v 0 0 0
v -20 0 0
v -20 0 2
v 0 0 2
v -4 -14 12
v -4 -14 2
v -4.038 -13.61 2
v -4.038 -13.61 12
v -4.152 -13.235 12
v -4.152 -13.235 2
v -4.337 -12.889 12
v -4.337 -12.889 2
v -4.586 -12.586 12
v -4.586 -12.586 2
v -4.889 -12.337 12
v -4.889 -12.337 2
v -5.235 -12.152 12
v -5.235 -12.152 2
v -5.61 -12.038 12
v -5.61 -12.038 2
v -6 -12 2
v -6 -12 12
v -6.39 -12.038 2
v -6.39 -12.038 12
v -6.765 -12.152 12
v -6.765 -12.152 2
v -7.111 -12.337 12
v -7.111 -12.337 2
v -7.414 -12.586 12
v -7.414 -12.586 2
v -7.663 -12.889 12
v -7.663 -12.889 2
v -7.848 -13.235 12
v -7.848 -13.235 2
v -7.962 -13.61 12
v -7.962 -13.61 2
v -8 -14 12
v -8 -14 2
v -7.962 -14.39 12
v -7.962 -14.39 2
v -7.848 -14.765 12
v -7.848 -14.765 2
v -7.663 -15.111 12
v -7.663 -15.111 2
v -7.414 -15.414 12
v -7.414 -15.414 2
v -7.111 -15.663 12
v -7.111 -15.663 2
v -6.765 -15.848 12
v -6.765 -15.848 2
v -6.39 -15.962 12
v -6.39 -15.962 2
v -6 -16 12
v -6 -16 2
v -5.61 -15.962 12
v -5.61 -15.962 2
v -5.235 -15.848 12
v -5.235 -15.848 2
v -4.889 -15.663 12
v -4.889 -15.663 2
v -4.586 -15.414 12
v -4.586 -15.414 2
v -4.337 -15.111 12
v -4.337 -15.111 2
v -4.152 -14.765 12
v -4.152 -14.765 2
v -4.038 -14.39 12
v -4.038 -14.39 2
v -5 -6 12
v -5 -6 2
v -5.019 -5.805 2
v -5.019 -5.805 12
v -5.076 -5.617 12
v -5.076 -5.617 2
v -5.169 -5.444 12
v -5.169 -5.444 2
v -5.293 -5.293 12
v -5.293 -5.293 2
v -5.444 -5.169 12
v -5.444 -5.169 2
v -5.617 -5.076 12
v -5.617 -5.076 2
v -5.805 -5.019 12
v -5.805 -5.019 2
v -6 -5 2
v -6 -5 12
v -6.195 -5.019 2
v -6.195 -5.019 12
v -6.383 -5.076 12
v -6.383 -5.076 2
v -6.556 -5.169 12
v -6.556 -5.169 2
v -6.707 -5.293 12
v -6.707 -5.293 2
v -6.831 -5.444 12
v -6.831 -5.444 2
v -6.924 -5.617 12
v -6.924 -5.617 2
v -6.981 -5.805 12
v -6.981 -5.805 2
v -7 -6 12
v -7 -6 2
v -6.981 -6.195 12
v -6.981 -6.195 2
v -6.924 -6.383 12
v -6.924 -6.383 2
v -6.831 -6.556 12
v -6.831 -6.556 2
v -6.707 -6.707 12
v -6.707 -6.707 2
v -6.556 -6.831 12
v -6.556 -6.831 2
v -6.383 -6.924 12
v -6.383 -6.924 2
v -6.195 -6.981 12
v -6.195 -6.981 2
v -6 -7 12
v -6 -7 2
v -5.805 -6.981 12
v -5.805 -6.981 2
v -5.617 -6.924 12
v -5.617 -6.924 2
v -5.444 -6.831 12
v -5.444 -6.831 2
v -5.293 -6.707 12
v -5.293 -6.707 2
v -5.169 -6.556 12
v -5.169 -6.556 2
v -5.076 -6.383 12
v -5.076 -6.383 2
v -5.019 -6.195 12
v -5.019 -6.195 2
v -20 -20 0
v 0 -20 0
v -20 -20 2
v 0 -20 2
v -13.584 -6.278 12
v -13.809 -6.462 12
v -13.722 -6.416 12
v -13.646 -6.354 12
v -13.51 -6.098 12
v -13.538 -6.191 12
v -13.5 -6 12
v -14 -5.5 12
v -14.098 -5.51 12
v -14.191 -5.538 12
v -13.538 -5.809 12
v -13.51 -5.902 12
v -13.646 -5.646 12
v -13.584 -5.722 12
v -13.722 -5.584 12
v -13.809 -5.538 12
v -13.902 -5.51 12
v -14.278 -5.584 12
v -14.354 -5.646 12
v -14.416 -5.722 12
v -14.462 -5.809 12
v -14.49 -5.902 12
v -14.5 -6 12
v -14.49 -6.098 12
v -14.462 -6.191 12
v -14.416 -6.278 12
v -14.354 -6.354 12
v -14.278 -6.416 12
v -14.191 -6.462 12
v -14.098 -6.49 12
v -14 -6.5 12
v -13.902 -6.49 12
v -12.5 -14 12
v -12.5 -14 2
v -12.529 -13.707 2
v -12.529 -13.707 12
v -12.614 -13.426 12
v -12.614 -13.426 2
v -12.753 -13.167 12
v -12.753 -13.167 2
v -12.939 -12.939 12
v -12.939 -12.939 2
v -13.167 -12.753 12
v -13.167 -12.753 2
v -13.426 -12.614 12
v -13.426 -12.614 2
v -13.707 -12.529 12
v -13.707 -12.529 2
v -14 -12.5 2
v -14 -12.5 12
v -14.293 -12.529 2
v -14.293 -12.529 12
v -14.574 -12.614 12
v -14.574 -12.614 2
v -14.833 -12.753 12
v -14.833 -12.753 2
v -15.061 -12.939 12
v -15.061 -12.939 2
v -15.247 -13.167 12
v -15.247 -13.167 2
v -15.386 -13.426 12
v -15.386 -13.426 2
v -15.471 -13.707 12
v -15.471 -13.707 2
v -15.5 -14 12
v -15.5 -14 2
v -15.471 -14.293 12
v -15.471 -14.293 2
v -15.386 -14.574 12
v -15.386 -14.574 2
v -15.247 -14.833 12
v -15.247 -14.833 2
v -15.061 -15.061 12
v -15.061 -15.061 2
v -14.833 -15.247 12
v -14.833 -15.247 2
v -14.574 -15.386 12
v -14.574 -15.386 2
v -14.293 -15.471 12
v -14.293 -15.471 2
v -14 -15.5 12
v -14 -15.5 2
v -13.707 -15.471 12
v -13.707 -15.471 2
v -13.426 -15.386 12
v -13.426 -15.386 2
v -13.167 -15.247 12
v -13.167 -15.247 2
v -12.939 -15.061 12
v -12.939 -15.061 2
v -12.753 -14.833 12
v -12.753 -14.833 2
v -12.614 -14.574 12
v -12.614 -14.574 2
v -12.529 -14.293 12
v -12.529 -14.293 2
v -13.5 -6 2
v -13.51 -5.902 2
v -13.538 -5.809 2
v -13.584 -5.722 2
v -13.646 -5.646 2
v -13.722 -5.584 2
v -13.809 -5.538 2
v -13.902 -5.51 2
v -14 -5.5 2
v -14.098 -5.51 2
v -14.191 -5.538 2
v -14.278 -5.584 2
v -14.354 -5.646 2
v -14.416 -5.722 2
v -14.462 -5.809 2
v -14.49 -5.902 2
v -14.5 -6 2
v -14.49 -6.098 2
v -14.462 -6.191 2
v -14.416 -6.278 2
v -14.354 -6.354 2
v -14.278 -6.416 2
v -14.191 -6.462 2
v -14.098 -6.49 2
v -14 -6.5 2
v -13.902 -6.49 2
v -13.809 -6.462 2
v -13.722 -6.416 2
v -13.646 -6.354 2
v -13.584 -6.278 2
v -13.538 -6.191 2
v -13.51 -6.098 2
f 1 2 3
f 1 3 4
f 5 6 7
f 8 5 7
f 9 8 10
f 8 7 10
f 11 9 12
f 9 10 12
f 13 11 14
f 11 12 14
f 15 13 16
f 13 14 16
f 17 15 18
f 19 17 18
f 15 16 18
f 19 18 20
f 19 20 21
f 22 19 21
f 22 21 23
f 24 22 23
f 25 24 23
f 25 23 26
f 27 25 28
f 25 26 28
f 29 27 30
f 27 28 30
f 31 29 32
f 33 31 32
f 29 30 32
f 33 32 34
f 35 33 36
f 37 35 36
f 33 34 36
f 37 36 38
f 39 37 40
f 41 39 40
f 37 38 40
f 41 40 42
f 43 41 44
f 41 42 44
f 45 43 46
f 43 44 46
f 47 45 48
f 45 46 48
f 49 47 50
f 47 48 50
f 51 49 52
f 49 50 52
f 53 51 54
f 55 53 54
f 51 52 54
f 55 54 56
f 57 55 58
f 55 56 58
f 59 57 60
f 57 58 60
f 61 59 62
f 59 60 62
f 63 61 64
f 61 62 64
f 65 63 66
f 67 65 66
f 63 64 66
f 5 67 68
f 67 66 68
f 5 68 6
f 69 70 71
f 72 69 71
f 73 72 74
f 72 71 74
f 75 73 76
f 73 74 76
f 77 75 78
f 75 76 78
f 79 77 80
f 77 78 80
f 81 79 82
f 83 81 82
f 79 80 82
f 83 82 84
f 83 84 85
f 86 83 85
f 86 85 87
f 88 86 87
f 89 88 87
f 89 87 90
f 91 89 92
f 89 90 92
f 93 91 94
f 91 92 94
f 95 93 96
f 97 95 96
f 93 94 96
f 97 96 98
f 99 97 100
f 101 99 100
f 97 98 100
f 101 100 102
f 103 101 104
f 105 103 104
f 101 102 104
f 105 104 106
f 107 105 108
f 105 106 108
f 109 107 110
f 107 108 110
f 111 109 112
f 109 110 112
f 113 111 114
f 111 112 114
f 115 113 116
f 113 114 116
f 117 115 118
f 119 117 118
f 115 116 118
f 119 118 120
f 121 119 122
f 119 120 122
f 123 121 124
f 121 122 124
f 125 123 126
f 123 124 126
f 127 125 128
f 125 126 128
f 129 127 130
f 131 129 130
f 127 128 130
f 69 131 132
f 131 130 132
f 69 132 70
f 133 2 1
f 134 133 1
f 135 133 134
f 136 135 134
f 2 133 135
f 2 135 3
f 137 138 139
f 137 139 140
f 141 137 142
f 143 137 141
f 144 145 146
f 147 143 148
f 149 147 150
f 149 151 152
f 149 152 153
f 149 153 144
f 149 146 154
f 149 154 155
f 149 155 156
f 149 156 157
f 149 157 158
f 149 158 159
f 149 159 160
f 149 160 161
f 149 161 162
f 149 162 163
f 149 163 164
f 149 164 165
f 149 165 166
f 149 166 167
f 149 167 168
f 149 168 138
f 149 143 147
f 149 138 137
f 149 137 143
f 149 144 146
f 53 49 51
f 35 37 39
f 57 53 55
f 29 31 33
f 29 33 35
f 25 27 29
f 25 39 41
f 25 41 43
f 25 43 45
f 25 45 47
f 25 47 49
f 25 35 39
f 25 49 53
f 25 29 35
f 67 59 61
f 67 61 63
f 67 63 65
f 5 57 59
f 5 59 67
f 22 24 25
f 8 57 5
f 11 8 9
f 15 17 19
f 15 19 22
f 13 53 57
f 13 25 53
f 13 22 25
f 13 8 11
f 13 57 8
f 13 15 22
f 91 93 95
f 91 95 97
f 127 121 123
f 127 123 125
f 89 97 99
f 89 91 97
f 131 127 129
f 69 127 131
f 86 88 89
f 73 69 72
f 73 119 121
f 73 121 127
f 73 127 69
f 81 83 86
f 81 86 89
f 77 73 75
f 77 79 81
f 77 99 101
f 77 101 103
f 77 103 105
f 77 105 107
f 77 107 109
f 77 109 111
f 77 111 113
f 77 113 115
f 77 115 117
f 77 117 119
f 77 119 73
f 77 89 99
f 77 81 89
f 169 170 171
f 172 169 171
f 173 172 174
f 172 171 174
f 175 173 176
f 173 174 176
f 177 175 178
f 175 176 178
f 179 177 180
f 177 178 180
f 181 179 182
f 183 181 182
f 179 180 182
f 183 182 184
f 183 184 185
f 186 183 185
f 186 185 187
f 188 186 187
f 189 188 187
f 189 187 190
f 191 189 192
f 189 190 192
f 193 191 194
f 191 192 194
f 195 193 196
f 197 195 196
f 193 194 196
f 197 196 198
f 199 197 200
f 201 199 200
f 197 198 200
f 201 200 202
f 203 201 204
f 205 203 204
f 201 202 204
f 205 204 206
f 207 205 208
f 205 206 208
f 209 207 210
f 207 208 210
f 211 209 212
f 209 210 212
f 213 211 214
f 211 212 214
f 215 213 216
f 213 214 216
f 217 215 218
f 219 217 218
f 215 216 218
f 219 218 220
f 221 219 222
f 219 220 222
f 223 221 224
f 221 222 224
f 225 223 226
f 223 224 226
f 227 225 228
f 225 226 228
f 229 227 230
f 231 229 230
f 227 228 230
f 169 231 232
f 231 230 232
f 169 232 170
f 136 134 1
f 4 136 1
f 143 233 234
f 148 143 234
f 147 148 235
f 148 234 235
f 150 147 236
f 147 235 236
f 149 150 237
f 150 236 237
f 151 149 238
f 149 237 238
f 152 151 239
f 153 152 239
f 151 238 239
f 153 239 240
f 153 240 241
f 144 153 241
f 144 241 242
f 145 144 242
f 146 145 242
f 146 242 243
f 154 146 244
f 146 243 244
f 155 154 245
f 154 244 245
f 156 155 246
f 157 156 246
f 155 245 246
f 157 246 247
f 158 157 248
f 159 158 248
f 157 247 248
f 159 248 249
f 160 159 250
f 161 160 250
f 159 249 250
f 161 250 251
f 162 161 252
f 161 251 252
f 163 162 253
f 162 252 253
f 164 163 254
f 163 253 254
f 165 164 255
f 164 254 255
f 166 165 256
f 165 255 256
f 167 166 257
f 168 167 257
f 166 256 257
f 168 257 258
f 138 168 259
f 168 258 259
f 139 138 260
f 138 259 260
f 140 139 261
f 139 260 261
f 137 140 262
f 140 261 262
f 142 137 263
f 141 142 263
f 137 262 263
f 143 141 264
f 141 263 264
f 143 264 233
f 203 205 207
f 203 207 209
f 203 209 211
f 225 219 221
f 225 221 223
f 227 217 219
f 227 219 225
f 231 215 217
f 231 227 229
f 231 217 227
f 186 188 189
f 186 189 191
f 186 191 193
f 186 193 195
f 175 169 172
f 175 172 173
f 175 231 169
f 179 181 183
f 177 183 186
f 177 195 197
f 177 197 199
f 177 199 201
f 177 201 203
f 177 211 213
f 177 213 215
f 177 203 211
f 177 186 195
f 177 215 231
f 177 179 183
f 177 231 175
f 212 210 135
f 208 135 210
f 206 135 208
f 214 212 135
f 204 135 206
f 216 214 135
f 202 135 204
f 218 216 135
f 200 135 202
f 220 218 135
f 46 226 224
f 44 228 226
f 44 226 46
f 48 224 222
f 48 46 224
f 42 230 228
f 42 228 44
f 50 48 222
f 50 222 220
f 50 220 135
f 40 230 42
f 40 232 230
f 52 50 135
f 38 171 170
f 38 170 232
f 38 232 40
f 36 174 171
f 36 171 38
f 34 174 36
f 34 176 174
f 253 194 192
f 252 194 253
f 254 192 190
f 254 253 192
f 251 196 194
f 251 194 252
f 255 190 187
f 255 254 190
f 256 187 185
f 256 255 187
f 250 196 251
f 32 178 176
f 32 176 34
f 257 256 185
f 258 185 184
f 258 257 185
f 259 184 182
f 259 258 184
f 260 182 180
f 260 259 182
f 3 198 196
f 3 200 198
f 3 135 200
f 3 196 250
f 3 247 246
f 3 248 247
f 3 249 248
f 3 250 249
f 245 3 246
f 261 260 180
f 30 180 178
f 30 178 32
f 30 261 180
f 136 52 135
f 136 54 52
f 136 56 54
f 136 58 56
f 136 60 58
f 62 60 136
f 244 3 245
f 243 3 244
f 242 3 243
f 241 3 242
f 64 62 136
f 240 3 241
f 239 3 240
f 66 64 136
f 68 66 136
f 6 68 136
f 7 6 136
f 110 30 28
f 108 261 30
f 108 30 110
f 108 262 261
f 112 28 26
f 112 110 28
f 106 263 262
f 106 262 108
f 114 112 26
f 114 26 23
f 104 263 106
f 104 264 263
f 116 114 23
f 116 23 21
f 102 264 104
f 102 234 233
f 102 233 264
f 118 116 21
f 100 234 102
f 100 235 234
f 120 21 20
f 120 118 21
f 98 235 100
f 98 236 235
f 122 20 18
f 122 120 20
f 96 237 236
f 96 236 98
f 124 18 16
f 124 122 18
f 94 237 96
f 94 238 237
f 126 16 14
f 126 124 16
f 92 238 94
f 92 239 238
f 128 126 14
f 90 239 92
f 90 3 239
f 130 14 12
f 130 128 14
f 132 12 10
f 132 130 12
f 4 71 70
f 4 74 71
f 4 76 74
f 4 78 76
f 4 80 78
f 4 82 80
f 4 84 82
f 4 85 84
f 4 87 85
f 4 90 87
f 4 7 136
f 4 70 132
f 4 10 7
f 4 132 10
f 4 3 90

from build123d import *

# Parameters (mm, degrees)
F0_W     = 20
F0_H     = 20
F0_R     = 1.5
F0_R_2   = 2
F0_R_3   = 0.5
F0_R_4   = 1
F1_DEPTH = 2
F2_R     = 1
F2_R_2   = 0.5
F2_R_3   = 2
F2_R_4   = 1.5
F3_DEPTH = 10


with BuildPart() as f1:
    # F0 (on Top) → F1 (new body)
    with BuildSketch(Plane.XY):
        with Locations((-10, -10)):
            Rectangle(F0_W, F0_H)
        with Locations((-14, -14)):
            Circle(F0_R, mode=Mode.SUBTRACT)
        with Locations((-6, -14)):
            Circle(F0_R_2, mode=Mode.SUBTRACT)
        with Locations((-14, -6)):
            Circle(F0_R_3, mode=Mode.SUBTRACT)
        with Locations((-6, -6)):
            Circle(F0_R_4, mode=Mode.SUBTRACT)
        with Locations((-14, -6)):
            Circle(F0_R_3)
        with Locations((-6, -6)):
            Circle(F0_R_4)
        with Locations((-6, -14)):
            Circle(F0_R_2)
        with Locations((-14, -14)):
            Circle(F0_R)
    extrude(amount=F1_DEPTH)

    # F2 (on face) → F3 (join)
    with BuildSketch(Plane.XY.offset(2)):
        with Locations((-6, -6)):
            Circle(F2_R)
        with Locations((-14, -6)):
            Circle(F2_R_2)
        with Locations((-6, -14)):
            Circle(F2_R_3)
        with Locations((-14, -14)):
            Circle(F2_R_4)
    extrude(amount=F3_DEPTH)


solid = f1.part
